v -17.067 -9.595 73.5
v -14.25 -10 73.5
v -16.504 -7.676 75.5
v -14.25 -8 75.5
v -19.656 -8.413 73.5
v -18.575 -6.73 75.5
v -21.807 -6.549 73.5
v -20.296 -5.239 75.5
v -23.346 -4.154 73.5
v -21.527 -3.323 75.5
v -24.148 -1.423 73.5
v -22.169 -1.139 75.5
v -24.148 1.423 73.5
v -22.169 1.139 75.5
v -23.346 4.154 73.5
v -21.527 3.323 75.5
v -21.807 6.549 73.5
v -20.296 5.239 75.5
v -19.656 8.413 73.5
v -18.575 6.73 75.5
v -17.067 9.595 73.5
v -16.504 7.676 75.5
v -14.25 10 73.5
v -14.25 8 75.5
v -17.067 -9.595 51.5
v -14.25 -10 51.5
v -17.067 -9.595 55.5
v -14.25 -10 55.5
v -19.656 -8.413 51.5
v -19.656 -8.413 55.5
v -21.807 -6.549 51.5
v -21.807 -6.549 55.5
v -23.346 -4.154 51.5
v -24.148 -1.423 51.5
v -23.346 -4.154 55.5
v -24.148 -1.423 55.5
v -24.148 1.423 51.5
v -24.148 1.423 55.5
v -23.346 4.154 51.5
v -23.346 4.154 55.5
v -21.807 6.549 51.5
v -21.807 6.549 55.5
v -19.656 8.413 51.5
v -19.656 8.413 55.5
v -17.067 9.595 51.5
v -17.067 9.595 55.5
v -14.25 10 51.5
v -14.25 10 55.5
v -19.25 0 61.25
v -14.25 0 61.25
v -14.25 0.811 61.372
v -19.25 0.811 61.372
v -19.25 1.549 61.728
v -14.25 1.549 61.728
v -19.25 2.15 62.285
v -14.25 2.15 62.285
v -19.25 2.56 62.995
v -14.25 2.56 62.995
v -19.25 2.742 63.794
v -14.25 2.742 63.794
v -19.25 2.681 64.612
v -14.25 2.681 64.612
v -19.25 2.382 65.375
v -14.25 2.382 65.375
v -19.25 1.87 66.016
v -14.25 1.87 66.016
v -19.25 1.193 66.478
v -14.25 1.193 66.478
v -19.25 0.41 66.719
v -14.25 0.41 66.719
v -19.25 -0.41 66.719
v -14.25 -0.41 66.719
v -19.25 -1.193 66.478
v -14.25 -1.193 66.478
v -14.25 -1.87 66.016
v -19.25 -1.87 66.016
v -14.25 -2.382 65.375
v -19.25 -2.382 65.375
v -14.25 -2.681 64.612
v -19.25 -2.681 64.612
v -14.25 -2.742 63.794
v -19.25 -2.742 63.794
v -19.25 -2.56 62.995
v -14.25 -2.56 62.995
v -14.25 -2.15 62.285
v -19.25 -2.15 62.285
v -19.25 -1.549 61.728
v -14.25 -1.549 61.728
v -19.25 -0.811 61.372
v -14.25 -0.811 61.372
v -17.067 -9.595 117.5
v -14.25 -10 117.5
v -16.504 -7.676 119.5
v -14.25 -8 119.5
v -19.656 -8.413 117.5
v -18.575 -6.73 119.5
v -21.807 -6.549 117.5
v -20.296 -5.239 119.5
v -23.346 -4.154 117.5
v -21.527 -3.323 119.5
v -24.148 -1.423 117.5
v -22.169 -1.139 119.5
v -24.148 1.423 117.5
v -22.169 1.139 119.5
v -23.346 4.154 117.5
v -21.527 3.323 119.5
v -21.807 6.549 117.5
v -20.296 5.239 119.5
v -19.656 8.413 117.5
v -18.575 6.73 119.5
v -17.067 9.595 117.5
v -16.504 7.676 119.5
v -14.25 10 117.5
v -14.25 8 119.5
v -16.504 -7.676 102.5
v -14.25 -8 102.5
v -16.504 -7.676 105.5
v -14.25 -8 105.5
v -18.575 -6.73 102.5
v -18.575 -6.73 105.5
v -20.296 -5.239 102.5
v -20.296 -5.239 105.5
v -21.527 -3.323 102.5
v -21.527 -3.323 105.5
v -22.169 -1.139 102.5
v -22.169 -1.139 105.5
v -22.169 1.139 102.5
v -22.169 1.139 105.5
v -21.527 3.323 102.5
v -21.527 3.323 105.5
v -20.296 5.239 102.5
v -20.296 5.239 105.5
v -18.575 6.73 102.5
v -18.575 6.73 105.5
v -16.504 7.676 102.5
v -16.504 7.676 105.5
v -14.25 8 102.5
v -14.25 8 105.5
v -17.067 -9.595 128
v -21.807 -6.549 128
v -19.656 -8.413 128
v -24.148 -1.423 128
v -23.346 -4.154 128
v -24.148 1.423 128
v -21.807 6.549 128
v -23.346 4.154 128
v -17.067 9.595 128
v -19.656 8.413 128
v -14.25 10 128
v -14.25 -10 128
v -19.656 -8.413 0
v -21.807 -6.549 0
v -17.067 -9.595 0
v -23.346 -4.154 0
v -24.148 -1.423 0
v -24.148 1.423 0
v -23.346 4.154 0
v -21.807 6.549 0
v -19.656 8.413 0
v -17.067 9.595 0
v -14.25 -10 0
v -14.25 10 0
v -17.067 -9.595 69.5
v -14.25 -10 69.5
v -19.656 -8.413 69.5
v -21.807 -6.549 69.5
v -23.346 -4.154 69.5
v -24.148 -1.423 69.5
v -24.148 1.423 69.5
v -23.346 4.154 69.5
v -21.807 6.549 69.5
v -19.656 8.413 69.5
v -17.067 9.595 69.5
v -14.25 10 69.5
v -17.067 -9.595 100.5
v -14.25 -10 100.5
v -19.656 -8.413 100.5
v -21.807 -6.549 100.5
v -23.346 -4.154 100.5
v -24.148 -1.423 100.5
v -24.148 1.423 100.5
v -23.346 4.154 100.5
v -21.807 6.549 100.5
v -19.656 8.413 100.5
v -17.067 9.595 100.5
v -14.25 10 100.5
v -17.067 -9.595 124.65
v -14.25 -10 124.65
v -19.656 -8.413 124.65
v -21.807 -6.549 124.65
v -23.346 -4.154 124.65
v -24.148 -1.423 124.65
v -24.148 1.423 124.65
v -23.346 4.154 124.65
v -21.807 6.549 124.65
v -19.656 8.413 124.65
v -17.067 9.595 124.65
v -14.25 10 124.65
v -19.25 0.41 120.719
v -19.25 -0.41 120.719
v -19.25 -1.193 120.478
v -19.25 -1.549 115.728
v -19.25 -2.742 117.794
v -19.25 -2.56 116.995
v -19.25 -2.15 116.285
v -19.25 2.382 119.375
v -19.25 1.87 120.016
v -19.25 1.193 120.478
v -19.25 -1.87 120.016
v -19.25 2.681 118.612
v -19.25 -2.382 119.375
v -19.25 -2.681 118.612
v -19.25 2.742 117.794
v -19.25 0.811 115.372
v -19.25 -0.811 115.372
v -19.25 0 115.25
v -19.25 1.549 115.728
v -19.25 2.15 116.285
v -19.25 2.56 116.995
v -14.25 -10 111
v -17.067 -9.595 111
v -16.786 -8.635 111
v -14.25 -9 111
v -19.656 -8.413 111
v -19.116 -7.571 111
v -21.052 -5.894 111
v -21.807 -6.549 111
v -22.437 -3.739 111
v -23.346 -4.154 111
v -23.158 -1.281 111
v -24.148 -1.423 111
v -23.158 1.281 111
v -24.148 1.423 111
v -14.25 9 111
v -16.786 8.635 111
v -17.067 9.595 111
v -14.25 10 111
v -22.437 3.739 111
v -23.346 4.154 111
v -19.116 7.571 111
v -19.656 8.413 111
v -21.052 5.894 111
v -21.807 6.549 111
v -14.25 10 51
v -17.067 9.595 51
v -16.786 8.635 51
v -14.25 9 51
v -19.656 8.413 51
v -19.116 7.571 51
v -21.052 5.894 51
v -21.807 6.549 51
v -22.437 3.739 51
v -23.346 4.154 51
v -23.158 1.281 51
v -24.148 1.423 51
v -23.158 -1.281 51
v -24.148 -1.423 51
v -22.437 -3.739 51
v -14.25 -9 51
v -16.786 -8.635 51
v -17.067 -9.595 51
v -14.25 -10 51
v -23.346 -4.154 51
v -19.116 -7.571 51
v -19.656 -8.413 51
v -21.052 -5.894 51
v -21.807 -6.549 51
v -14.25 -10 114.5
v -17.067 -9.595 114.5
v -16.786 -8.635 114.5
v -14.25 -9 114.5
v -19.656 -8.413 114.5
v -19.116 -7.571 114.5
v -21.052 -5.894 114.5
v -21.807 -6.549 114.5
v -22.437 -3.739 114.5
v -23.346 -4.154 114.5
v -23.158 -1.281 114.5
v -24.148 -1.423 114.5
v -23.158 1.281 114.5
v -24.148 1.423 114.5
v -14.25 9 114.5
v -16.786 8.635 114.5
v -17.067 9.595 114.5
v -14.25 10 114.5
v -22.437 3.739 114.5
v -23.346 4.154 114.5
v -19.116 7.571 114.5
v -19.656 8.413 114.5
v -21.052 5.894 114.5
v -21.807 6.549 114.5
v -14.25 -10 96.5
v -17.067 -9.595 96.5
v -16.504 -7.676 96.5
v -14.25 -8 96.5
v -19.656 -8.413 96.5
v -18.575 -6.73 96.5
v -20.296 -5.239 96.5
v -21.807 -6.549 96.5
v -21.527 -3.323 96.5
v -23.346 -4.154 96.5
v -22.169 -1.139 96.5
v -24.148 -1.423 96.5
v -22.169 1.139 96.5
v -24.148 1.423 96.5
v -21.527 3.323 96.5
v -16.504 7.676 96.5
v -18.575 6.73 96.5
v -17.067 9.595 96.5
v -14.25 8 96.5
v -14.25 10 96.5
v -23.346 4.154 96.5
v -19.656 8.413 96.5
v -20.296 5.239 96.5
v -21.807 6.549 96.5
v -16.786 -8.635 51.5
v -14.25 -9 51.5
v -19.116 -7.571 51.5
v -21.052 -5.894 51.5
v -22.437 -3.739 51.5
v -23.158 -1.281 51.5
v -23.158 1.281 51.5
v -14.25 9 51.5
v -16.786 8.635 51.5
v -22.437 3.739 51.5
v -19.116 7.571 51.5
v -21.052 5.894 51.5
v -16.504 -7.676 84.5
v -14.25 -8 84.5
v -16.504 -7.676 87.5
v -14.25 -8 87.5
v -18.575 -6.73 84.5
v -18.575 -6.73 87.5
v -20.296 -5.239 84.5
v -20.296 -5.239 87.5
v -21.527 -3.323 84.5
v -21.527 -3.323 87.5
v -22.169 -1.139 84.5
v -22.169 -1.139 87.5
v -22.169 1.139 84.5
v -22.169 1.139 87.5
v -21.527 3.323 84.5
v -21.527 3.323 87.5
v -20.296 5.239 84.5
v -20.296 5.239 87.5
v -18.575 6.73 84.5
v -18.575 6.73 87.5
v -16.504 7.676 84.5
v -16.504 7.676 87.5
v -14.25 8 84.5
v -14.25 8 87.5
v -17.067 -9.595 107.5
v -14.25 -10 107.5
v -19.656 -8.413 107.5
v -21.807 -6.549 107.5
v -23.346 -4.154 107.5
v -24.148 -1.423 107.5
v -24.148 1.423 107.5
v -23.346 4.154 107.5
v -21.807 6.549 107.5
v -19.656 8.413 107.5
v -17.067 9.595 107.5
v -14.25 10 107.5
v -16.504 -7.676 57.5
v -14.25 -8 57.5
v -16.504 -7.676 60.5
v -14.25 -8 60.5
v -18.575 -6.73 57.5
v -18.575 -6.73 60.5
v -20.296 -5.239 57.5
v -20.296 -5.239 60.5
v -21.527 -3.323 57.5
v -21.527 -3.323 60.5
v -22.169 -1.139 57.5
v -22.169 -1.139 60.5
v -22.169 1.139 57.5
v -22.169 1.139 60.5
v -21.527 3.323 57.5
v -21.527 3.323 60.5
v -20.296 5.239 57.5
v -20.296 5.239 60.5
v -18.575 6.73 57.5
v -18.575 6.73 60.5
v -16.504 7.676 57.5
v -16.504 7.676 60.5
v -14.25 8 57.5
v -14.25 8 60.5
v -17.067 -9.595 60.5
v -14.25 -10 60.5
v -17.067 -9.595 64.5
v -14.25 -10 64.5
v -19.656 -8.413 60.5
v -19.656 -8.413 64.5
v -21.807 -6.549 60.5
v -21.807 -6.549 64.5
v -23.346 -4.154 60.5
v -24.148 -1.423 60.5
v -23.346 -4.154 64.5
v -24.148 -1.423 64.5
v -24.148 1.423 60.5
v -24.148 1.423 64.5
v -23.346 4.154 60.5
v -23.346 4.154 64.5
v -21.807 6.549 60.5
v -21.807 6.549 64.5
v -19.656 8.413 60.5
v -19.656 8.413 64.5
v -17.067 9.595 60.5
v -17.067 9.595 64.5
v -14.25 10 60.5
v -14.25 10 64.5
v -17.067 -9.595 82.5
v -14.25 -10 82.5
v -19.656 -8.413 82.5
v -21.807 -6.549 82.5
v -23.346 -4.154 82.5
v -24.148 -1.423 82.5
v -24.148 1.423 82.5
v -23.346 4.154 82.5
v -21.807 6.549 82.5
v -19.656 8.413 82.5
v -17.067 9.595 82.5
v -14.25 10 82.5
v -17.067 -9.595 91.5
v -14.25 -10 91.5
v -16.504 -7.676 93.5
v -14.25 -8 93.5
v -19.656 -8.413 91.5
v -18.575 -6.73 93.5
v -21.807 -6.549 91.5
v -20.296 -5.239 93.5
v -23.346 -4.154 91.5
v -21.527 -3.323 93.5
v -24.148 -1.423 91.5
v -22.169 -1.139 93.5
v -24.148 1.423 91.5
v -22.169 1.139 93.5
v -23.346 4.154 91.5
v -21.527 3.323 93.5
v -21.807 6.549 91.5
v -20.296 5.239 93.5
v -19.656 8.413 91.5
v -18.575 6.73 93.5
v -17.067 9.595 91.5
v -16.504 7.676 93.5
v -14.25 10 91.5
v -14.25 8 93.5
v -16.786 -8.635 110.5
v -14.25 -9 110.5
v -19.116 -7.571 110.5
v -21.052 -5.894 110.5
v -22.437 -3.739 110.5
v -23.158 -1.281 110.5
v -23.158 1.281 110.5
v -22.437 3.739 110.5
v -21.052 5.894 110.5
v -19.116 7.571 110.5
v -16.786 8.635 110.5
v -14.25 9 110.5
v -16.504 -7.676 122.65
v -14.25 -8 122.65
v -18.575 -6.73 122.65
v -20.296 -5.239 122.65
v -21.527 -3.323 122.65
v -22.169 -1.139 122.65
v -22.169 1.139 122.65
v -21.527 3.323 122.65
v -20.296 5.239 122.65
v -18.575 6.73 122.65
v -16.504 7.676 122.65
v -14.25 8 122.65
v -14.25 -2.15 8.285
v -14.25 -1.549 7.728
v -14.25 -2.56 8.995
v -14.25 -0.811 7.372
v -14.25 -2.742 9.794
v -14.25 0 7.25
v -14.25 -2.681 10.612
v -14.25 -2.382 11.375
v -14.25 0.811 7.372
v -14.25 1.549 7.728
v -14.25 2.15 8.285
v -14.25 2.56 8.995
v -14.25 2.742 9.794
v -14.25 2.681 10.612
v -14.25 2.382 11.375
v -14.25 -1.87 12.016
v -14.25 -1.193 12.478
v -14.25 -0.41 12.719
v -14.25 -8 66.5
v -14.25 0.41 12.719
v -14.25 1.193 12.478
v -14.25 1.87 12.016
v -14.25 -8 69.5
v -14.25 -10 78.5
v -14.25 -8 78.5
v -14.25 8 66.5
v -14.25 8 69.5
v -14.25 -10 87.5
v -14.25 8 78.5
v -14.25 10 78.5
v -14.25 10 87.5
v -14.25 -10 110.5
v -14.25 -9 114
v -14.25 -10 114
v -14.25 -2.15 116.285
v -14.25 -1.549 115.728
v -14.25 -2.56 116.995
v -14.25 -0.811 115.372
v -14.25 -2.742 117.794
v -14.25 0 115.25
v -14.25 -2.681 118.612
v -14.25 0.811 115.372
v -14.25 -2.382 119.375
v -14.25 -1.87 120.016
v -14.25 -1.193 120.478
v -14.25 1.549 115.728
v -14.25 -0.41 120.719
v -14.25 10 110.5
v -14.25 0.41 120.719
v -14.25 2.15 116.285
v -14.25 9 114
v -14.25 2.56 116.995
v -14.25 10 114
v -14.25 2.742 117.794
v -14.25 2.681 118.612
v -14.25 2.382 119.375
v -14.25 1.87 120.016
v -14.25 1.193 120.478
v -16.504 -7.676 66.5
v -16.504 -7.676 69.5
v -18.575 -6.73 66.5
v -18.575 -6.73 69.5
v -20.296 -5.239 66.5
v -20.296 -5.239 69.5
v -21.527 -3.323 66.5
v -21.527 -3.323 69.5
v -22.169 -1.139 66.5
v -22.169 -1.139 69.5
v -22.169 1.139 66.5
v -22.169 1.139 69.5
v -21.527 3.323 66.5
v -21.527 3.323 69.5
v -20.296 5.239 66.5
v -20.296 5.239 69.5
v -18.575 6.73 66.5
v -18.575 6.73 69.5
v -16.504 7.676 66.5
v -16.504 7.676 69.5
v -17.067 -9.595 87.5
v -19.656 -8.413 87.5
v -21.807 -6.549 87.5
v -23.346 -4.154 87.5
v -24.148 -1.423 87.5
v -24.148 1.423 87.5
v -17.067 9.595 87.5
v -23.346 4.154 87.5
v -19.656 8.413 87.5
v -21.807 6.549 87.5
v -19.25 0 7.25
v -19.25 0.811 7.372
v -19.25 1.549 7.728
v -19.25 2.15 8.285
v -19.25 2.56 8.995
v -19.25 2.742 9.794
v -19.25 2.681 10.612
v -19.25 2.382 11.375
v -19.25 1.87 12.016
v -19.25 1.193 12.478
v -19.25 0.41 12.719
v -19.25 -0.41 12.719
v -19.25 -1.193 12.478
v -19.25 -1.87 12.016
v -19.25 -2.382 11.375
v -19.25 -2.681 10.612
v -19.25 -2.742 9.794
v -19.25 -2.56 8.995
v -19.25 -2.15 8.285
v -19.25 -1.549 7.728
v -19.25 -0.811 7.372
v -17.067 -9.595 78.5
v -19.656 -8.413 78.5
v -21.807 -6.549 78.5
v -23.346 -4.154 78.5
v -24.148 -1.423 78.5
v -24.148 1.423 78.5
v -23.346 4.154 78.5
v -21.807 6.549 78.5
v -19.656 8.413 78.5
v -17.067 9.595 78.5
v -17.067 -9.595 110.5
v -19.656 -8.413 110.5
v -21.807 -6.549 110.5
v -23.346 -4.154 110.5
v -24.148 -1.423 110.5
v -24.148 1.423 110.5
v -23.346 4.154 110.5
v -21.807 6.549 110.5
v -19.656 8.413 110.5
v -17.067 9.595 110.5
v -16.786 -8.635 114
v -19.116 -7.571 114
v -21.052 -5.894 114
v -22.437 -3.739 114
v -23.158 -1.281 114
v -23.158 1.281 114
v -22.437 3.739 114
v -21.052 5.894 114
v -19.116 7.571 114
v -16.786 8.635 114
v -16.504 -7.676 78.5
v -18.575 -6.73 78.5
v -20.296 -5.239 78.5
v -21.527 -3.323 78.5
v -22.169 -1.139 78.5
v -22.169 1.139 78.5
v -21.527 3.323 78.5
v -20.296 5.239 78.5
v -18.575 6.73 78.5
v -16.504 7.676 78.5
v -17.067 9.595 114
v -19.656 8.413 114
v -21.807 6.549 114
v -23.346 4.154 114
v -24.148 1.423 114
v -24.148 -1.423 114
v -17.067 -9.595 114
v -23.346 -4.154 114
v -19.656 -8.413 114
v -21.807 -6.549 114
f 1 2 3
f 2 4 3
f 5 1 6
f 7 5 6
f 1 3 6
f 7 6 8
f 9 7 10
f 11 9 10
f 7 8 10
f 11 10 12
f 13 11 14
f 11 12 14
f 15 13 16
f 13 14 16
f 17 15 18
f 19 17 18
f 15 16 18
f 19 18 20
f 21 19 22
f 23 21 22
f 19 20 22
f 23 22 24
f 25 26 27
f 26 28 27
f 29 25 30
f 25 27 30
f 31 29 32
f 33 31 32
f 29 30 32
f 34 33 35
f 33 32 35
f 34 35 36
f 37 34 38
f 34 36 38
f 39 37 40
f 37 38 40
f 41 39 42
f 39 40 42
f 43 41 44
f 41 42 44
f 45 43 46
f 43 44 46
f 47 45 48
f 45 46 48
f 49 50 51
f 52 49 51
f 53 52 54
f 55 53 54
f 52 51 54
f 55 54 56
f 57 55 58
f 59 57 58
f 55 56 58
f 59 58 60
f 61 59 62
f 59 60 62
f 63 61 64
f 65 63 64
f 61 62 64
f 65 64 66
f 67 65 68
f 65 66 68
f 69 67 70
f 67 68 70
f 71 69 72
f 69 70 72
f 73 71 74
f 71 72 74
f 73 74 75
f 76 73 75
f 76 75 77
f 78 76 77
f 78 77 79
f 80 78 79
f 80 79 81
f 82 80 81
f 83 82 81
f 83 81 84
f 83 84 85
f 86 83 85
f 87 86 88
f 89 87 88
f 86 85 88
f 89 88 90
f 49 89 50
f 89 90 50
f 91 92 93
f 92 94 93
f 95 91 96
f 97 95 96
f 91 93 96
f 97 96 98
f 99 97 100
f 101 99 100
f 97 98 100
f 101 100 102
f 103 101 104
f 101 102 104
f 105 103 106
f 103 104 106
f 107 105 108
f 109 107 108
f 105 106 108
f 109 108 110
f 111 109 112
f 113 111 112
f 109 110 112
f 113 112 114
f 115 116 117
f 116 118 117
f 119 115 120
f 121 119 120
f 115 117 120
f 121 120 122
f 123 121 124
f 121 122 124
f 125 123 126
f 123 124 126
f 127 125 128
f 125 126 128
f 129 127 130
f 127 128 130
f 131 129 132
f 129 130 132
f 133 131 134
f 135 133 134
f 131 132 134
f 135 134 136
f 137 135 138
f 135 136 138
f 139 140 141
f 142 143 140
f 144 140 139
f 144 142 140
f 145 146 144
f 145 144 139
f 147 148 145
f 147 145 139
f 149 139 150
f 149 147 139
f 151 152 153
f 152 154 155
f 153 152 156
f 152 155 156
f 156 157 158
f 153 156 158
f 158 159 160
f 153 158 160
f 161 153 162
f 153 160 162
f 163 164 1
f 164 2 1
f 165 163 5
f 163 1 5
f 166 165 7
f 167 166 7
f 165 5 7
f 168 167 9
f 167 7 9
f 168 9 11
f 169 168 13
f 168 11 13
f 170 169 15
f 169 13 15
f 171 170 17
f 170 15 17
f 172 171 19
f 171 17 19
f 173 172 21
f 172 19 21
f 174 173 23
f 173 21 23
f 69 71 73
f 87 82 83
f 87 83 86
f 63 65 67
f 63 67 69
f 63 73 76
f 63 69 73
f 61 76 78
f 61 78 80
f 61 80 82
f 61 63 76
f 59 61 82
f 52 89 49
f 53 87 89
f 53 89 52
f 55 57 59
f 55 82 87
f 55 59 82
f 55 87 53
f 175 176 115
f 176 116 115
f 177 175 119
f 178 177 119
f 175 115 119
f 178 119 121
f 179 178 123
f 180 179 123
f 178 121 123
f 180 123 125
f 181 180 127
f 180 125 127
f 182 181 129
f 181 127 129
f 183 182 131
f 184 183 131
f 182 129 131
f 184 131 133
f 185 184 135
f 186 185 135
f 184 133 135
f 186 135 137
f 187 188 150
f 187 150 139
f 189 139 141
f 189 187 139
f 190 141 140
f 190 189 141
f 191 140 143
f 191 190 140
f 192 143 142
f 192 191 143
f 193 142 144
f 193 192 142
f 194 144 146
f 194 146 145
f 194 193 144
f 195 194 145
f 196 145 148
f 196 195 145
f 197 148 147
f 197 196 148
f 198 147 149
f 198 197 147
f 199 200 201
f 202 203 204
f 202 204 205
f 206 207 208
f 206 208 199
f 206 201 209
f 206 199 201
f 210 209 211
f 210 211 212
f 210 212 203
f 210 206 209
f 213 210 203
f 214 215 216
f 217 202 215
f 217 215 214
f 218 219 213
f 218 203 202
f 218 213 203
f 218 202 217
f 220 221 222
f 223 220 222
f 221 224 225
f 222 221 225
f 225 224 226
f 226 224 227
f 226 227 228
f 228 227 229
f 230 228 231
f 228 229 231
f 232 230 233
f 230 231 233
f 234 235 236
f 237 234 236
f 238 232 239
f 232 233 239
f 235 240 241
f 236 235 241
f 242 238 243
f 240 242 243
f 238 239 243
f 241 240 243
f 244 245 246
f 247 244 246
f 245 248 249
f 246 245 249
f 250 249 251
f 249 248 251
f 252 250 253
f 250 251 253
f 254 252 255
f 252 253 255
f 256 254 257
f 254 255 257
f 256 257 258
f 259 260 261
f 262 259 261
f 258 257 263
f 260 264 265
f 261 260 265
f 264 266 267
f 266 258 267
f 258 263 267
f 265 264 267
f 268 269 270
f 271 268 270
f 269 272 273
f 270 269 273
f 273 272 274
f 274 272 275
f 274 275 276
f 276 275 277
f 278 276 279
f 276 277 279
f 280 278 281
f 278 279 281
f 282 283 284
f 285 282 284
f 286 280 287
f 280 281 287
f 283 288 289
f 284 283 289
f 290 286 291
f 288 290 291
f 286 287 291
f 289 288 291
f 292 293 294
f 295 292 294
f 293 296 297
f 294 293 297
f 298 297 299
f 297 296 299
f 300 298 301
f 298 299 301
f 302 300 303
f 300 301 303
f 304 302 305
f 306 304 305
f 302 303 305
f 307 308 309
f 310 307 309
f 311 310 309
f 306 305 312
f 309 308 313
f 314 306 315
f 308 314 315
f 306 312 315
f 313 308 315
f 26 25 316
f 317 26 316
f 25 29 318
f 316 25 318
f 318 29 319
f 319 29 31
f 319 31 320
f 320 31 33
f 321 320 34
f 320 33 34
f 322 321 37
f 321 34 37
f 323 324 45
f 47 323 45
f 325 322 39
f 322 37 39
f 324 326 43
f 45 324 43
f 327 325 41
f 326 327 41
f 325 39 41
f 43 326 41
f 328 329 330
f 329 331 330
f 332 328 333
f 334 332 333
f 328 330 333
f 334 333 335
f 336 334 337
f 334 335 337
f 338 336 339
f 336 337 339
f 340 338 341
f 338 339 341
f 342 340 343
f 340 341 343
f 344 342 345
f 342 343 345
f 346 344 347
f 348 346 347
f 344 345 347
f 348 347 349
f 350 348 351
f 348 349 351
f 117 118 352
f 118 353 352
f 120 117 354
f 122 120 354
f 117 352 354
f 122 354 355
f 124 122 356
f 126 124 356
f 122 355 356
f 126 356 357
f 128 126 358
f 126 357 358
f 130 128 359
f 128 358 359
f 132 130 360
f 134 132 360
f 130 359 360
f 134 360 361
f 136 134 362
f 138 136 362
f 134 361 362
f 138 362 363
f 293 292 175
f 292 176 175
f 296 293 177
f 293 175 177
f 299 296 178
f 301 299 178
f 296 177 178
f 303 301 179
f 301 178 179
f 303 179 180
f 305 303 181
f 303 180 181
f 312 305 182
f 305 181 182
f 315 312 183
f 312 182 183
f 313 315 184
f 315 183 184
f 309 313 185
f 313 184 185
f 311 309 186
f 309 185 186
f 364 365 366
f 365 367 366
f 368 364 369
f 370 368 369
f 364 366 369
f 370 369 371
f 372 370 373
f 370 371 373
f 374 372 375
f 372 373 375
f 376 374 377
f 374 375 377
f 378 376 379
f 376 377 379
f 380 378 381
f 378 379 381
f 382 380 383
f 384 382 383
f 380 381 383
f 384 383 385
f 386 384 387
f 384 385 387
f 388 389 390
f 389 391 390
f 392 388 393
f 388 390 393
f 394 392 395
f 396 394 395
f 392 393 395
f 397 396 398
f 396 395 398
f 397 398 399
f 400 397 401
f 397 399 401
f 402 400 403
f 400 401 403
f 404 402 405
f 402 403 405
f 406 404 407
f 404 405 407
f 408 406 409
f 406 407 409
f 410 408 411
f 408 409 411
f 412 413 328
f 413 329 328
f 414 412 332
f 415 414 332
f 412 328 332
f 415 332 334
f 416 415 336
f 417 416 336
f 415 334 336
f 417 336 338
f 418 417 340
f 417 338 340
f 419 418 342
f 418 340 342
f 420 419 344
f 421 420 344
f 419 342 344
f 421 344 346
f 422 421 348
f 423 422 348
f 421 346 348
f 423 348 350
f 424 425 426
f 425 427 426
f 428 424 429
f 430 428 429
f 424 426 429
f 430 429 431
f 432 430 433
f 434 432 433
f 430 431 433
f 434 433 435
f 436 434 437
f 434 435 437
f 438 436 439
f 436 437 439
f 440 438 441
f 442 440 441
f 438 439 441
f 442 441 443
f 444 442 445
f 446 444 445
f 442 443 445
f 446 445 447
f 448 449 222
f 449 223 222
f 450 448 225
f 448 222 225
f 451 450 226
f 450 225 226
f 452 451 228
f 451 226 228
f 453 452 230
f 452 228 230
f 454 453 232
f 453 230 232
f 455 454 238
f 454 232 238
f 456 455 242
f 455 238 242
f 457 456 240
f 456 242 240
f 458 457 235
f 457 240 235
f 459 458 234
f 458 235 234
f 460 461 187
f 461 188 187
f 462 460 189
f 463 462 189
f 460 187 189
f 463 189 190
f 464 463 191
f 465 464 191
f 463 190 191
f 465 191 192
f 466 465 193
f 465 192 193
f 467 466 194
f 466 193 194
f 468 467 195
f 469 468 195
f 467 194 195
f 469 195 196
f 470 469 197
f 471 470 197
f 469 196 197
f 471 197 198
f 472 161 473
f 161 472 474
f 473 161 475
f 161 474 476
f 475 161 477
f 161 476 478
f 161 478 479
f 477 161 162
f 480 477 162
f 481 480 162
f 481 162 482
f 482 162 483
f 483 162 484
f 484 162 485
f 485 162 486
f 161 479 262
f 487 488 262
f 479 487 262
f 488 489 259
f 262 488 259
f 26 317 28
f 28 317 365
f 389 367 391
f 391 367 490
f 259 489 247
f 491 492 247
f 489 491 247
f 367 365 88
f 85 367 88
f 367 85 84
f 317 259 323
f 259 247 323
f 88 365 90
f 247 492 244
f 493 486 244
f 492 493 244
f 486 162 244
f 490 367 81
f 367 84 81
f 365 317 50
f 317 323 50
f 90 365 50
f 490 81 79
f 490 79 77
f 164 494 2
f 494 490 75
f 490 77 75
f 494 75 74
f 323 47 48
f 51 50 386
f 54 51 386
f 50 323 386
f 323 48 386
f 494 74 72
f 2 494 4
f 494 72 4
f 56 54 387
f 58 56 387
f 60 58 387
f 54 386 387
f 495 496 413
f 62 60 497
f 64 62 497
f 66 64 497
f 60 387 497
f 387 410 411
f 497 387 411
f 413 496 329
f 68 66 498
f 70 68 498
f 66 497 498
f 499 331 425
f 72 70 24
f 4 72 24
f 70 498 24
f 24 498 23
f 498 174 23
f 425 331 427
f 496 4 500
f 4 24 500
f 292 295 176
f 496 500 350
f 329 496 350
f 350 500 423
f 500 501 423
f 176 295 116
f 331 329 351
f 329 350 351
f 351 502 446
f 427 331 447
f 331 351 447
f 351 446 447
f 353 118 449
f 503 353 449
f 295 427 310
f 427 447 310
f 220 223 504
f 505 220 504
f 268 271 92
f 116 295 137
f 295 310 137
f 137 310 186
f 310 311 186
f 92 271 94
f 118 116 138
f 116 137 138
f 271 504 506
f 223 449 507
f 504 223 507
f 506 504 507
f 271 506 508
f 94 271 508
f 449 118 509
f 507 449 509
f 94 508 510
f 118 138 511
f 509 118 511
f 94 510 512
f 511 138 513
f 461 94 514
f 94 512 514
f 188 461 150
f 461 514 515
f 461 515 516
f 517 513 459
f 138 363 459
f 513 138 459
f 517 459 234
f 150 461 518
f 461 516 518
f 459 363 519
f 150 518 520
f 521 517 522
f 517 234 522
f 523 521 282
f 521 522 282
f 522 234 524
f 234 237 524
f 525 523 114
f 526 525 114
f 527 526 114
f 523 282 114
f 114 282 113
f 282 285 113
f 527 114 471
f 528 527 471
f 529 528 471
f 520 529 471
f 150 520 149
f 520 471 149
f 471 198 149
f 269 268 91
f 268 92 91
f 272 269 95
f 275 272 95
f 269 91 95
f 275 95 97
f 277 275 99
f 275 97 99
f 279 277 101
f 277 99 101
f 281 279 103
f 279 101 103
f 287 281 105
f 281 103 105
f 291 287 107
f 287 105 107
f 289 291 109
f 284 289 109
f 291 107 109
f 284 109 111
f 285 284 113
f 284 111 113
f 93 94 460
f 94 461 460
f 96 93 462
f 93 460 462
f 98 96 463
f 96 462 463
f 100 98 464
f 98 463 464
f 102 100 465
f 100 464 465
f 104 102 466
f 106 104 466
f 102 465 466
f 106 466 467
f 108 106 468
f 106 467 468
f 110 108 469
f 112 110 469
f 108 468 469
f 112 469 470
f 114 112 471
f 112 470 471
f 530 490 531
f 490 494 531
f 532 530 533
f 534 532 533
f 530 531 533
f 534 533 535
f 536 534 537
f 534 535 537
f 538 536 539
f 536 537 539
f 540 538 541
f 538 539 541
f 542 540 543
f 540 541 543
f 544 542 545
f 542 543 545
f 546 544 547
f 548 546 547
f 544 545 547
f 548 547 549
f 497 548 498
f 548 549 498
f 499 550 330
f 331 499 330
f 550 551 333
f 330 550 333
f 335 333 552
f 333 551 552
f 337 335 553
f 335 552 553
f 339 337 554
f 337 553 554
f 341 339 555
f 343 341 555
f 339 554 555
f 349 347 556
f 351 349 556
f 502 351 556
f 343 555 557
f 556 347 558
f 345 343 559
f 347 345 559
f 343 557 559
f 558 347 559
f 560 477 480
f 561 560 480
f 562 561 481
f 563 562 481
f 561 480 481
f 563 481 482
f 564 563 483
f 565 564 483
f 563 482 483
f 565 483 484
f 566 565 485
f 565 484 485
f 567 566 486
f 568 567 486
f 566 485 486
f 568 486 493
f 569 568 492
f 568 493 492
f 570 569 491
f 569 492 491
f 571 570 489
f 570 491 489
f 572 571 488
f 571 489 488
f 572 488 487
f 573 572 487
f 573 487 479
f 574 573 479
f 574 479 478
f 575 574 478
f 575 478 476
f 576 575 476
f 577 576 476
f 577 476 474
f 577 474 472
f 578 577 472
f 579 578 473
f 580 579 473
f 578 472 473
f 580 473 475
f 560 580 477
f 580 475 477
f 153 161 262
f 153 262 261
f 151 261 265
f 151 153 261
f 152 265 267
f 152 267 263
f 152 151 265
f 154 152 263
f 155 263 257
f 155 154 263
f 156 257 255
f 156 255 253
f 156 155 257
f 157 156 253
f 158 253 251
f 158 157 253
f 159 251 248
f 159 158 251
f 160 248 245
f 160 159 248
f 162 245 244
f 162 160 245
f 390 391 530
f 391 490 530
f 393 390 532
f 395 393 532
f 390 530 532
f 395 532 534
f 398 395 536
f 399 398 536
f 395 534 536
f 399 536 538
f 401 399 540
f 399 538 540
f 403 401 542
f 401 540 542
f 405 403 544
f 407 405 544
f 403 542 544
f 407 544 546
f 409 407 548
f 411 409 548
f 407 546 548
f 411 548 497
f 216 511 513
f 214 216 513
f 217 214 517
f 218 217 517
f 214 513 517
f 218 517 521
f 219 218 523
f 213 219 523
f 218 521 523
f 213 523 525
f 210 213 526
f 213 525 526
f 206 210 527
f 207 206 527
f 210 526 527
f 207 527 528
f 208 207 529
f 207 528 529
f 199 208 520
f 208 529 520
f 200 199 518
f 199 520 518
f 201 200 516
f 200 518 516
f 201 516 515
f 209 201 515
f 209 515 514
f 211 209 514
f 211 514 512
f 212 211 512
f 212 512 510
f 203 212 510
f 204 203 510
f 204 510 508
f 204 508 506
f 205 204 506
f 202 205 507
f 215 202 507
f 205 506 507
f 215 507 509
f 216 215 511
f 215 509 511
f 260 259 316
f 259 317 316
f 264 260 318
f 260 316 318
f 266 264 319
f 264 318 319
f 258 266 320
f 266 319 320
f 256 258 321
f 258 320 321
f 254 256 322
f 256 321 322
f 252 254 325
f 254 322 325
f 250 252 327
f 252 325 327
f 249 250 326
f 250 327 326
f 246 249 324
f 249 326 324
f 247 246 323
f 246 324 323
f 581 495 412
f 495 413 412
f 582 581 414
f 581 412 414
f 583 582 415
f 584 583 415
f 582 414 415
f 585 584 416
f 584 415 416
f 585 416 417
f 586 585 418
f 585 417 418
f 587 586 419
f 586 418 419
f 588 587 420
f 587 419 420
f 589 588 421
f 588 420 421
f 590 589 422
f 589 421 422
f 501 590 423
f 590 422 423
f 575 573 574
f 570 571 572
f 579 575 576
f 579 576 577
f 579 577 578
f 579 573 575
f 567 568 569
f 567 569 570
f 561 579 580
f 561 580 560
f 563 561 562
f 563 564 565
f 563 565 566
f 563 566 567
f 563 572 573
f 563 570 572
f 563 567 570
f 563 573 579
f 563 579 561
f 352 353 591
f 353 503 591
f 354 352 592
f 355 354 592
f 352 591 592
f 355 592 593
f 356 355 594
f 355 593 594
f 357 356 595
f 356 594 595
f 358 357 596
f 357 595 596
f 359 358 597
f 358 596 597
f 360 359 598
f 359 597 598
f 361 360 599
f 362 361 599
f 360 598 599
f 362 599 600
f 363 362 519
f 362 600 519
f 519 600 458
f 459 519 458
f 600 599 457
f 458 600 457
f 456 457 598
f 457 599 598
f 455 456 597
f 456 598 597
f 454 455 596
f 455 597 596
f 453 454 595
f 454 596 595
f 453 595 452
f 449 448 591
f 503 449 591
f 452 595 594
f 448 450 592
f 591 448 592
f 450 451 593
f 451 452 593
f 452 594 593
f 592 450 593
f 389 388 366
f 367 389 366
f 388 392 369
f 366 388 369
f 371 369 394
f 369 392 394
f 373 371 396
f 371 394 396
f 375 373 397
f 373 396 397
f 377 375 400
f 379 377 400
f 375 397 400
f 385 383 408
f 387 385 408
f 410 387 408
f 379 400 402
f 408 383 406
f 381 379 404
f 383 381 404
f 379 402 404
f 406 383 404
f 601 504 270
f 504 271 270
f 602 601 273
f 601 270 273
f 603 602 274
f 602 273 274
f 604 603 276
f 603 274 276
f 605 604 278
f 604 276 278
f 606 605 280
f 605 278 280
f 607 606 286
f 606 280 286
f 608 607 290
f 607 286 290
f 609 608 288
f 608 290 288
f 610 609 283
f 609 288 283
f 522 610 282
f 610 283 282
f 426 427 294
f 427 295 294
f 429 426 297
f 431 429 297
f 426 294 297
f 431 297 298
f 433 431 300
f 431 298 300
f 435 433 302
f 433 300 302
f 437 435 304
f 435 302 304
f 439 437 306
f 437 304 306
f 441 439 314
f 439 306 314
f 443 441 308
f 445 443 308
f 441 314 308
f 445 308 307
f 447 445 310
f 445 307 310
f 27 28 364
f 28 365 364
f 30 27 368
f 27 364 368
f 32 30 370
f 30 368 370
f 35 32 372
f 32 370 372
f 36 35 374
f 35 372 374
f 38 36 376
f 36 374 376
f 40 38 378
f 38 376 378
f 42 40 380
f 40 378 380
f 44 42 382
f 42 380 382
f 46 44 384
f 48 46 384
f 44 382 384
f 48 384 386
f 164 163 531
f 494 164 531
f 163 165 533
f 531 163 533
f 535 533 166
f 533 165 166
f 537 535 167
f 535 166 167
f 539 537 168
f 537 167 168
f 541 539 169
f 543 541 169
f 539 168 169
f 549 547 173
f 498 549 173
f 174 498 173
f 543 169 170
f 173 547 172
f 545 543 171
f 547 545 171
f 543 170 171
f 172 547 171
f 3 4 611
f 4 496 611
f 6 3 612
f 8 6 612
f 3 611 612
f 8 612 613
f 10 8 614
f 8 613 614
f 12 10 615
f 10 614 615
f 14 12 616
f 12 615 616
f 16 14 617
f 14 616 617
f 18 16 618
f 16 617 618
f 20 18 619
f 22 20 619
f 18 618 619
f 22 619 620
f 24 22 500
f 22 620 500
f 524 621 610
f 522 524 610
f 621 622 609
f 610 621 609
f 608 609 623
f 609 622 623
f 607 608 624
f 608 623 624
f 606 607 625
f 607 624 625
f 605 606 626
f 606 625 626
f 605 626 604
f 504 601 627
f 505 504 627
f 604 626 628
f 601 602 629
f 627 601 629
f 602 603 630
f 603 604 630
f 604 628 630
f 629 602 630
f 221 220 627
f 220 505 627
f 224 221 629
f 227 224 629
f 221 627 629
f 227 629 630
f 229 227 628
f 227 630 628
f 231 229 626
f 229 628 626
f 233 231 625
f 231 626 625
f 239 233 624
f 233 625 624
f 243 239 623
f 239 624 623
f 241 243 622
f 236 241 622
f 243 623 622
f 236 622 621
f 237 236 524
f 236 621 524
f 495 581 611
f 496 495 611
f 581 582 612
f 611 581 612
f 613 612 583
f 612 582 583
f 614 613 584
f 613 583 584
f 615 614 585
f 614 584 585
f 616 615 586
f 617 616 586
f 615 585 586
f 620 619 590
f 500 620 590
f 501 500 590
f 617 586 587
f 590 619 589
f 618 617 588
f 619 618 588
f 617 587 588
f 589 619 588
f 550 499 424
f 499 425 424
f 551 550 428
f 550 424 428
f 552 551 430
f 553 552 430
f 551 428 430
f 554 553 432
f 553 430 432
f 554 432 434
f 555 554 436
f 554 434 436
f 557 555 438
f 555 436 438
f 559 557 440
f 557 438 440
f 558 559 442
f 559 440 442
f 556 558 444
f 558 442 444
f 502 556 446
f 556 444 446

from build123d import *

# Parameters (mm, degrees)
SKETCH1_W               = 28.5
SKETCH1_H               = 23
CENTRE_BLOCK_DEPTH      = 128
TOP_CYLINDER_DEPTH      = 7
TOP_CYLINDER_DEPTH_BACK = 90
CUT_REVOLVE2_ANGLE      = 180
NOSE_DEPTH              = 131.828370394
T_CROSS_REACH           = 134.885
SKETCH6_R               = 12
BARREL_DEPTH            = 7
SIDE_CYLINDER_DEPTH     = 128
CUT_REVOLVE1_ANGLE      = 180
SKETCH8_R               = 2.75
BACK_HOLE_DEPTH         = 5
SKETCH12_W              = 5
SKETCH12_H              = 80
CUT_EXTRUDE4_DEPTH      = 5
SKETCH15_R              = 2.75
CUT_EXTRUDE6_DEPTH      = 10
FILLET2_R               = 1
SKETCH16_R              = 6.5
CUT_EXTRUDE7_DEPTH      = 20
SKETCH21_W              = 152.585030794
SKETCH21_H              = 42.838852891
CUT_EXTRUDE12_DEPTH     = 133.885289011
SKETCH24_R              = 2.75
CUT_EXTRUDE13_DEPTH     = 5


with BuildPart() as part:
    # Sketch1 → Centre block (new body)
    with BuildSketch(Plane.XY):
        Rectangle(SKETCH1_W, SKETCH1_H)
    extrude(amount=CENTRE_BLOCK_DEPTH)

    # Sketch3 → top cylinder (add, two sides: drawn at the far end of the back side and taken through both)
    with BuildSketch(Plane(origin=(0, 0, 0), x_dir=(-1, 0, 0), z_dir=(0, 0, -1)).offset(-TOP_CYLINDER_DEPTH_BACK)):
        with BuildLine():
            Line((-10, 11.5), (10, 11.5))
            ThreePointArc((10, 11.5), (0, 21.5), (-10, 11.5))
        make_face()
    extrude(amount=TOP_CYLINDER_DEPTH + TOP_CYLINDER_DEPTH_BACK)

    # Sketch9 → Cut-Revolve2 (revolve, cut)
    with BuildSketch(Plane(origin=(0, 11.5, 0), x_dir=(1, 0, 0), z_dir=(0, 1, 0))):
        Polygon((10, -78), (10, -81.888582416), (23.187071127, -81.888582416), (23.187071127, -74.052631606), (23.187071127, 0), (10, 0), (10, -8), (9.5, -8), (9.5, -8.5), (10, -8.5), (10, -11.5), (8, -13.5), (8, -16.5), (10, -18.5), (10, -21.5), (9.5, -21.5), (9.5, -22), (10, -22), (10, -25), (9.5, -25), (9.5, -25.5), (10, -25.5), (10, -28.5), (8, -30.5), (8, -33.5), (10, -35.5), (10, -38.5), (8, -38.5), (8, -41.5), (10, -43.5), (10, -48.5), (8, -48.5), (8, -51.5), (10, -53.5), (10, -58.5), (8, -58.5), (8, -60.3), (8, -61.5), (10, -63.5), (10, -68.5), (8, -68.5), (8, -70.3), (8, -71.5), (10, -73.5), (10, -74.052631606), (10, -77.5), (9.5, -77.5), (9.5, -78), align=None)
    revolve(axis=Axis((0, 11.5, -7), (0, 0, 1)), revolution_arc=CUT_REVOLVE2_ANGLE, mode=Mode.SUBTRACT)

    # Sketch4 → nose (cut, through all)
    with BuildSketch(Plane.XZ.offset(-11.5)):
        with BuildLine():
            Line((-3.25, -7), (-3.25, -2))
            ThreePointArc((-3.25, -2), (-3.835786438, -0.585786438), (-5.25, 0))
            Line((-5.25, 0), (-10, 0))
            Line((-10, 0), (-10, -7))
            Line((-10, -7), (-3.25, -7))
        make_face()
        with BuildLine():
            Line((3.75, -7), (3.75, -2))
            ThreePointArc((3.75, -2), (4.335786438, -0.585786438), (5.75, 0))
            Line((5.75, 0), (10, 0))
            Line((10, 0), (10, -7))
            Line((10, -7), (3.75, -7))
        make_face()
    extrude(amount=-NOSE_DEPTH, mode=Mode.SUBTRACT)

    # t cross: up to this face of the body (flat: up to its plane)
    t_cross_end = Plane(part.part.faces().sort_by_distance((-14.25, 0, 64))[0])
    # Sketch5 → t cross (add, up to the picked face)
    with BuildSketch(Plane(origin=(14.25, 0, 0), x_dir=(0, 0, -1), z_dir=(1, 0, 0)), mode=Mode.PRIVATE) as t_cross_sk1:
        with BuildLine():
            Line((-101, 11.5), (-81, 11.5))
            ThreePointArc((-81, 11.5), (-91, 21.5), (-101, 11.5))
        make_face()
    t_cross_tool1 = split(extrude(t_cross_sk1.sketch, amount=-T_CROSS_REACH, mode=Mode.PRIVATE), bisect_by=t_cross_end, keep=Keep.BOTH, mode=Mode.PRIVATE)
    add(t_cross_tool1.solids().sort_by(Axis((14.25, 15.744132, 91), (-1, 0, 0)))[0])

    # Sketch6 → Barrel (add)
    with BuildSketch(Plane(origin=(0, 0, 0), x_dir=(-1, 0, 0), z_dir=(0, 0, -1))):
        with Locations((0, 0.5)):
            Circle(SKETCH6_R)
    extrude(amount=BARREL_DEPTH)

    # Sketch2 → side cylinder (add)
    with BuildSketch(Plane(origin=(0, 0, 0), x_dir=(-1, 0, 0), z_dir=(0, 0, -1))):
        with BuildLine():
            Line((14.25, 10), (14.25, -10))
            ThreePointArc((14.25, -10), (24.25, 0), (14.25, 10))
        make_face()
    extrude(amount=-SIDE_CYLINDER_DEPTH)

    # Sketch7 → Cut-Revolve1 (revolve, cut)
    with BuildSketch(Plane(origin=(-14.25, 0, 0), x_dir=(0, 0, -1), z_dir=(1, 0, 0))):
        Polygon((-51, -10), (-51, -9), (-51.5, -9), (-51.5, -10), (-55.5, -10), (-57.5, -8), (-58.77482941, -8), (-60.5, -8), (-60.5, -10), (-64.5, -10), (-66.5, -8), (-67.77482941, -8), (-69.5, -8), (-69.5, -10), (-73.5, -10), (-75.5, -8), (-76.77482941, -8), (-78.5, -8), (-78.5, -10), (-82.5, -10), (-84.5, -8), (-85.77482941, -8), (-87.5, -8), (-87.5, -10), (-91.5, -10), (-93.5, -8), (-94.77482941, -8), (-96.5, -8), (-96.5, -10), (-100.5, -10), (-102.5, -8), (-105.5, -8), (-107.5, -10), (-110.5, -10), (-110.5, -9), (-111, -9), (-111, -10), (-114, -10), (-114, -9), (-114.5, -9), (-114.5, -10), (-117.5, -10), (-119.5, -8), (-122.65, -8), (-124.65, -10), (-124.65, -14.812383498), (-117.5, -14.812383498), (0, -14.812383498), (0, -10), align=None)
    revolve(axis=Axis((-14.25, 0, 135.382259058), (0, 0, -1)), revolution_arc=CUT_REVOLVE1_ANGLE, mode=Mode.SUBTRACT)

    # Sketch8 → Back hole (cut)
    with BuildSketch(Plane.XY.offset(128)):
        Circle(SKETCH8_R)
    extrude(amount=-BACK_HOLE_DEPTH, mode=Mode.SUBTRACT)

    # Sketch12 → Cut-Extrude4 (cut)
    with BuildSketch(Plane.XZ.offset(11.5)):
        with Locations((0, 78)):
            Rectangle(SKETCH12_W, SKETCH12_H)
    extrude(amount=-CUT_EXTRUDE4_DEPTH, mode=Mode.SUBTRACT)

    # Sketch15 → Cut-Extrude6 (cut)
    with BuildSketch(Plane(origin=(14.25, 0, 0), x_dir=(0, 0, -1), z_dir=(1, 0, 0))):
        with Locations((-91, 11.5)):
            Circle(SKETCH15_R)
        with Locations((-91, -5.5)):
            Circle(SKETCH15_R)
    extrude(amount=-CUT_EXTRUDE6_DEPTH, mode=Mode.SUBTRACT)

    # Fillet2
    fillet2_edges = [part.edges().sort_by_distance(p)[0] for p in [
        (-14.25, 11.5, 40.5),
        (14.25, 11.5, 40.5),
        (14.25, -11.5, 64),
        (-14.25, -11.5, 64),
        (-14.25, 11.5, 114.5),
        (14.25, 11.5, 114.5),
    ]]
    fillet(fillet2_edges, radius=FILLET2_R)

    # Sketch16 → Cut-Extrude7 (cut)
    with BuildSketch(Plane(origin=(0, 0, -7), x_dir=(-1, 0, 0), z_dir=(0, 0, -1))):
        Circle(SKETCH16_R)
    extrude(amount=-CUT_EXTRUDE7_DEPTH, mode=Mode.SUBTRACT)

    # Sketch21 → Cut-Extrude12 (cut, through all)
    with BuildSketch(Plane.ZY.offset(14.25)):
        with Locations((64.09795532, 3.365381731)):
            Rectangle(SKETCH21_W, SKETCH21_H)
    extrude(amount=-CUT_EXTRUDE12_DEPTH, mode=Mode.SUBTRACT)

    # Sketch24 → Cut-Extrude13 (cut)
    with BuildSketch(Plane(origin=(-14.25, 0, 0), x_dir=(0, 0, -1), z_dir=(1, 0, 0))):
        with Locations((-118, 0)):
            Circle(SKETCH24_R)
        with Locations((-64, 0)):
            Circle(SKETCH24_R)
        with Locations((-10, 0)):
            Circle(SKETCH24_R)
    extrude(amount=-CUT_EXTRUDE13_DEPTH, mode=Mode.SUBTRACT)


solid = part.part
